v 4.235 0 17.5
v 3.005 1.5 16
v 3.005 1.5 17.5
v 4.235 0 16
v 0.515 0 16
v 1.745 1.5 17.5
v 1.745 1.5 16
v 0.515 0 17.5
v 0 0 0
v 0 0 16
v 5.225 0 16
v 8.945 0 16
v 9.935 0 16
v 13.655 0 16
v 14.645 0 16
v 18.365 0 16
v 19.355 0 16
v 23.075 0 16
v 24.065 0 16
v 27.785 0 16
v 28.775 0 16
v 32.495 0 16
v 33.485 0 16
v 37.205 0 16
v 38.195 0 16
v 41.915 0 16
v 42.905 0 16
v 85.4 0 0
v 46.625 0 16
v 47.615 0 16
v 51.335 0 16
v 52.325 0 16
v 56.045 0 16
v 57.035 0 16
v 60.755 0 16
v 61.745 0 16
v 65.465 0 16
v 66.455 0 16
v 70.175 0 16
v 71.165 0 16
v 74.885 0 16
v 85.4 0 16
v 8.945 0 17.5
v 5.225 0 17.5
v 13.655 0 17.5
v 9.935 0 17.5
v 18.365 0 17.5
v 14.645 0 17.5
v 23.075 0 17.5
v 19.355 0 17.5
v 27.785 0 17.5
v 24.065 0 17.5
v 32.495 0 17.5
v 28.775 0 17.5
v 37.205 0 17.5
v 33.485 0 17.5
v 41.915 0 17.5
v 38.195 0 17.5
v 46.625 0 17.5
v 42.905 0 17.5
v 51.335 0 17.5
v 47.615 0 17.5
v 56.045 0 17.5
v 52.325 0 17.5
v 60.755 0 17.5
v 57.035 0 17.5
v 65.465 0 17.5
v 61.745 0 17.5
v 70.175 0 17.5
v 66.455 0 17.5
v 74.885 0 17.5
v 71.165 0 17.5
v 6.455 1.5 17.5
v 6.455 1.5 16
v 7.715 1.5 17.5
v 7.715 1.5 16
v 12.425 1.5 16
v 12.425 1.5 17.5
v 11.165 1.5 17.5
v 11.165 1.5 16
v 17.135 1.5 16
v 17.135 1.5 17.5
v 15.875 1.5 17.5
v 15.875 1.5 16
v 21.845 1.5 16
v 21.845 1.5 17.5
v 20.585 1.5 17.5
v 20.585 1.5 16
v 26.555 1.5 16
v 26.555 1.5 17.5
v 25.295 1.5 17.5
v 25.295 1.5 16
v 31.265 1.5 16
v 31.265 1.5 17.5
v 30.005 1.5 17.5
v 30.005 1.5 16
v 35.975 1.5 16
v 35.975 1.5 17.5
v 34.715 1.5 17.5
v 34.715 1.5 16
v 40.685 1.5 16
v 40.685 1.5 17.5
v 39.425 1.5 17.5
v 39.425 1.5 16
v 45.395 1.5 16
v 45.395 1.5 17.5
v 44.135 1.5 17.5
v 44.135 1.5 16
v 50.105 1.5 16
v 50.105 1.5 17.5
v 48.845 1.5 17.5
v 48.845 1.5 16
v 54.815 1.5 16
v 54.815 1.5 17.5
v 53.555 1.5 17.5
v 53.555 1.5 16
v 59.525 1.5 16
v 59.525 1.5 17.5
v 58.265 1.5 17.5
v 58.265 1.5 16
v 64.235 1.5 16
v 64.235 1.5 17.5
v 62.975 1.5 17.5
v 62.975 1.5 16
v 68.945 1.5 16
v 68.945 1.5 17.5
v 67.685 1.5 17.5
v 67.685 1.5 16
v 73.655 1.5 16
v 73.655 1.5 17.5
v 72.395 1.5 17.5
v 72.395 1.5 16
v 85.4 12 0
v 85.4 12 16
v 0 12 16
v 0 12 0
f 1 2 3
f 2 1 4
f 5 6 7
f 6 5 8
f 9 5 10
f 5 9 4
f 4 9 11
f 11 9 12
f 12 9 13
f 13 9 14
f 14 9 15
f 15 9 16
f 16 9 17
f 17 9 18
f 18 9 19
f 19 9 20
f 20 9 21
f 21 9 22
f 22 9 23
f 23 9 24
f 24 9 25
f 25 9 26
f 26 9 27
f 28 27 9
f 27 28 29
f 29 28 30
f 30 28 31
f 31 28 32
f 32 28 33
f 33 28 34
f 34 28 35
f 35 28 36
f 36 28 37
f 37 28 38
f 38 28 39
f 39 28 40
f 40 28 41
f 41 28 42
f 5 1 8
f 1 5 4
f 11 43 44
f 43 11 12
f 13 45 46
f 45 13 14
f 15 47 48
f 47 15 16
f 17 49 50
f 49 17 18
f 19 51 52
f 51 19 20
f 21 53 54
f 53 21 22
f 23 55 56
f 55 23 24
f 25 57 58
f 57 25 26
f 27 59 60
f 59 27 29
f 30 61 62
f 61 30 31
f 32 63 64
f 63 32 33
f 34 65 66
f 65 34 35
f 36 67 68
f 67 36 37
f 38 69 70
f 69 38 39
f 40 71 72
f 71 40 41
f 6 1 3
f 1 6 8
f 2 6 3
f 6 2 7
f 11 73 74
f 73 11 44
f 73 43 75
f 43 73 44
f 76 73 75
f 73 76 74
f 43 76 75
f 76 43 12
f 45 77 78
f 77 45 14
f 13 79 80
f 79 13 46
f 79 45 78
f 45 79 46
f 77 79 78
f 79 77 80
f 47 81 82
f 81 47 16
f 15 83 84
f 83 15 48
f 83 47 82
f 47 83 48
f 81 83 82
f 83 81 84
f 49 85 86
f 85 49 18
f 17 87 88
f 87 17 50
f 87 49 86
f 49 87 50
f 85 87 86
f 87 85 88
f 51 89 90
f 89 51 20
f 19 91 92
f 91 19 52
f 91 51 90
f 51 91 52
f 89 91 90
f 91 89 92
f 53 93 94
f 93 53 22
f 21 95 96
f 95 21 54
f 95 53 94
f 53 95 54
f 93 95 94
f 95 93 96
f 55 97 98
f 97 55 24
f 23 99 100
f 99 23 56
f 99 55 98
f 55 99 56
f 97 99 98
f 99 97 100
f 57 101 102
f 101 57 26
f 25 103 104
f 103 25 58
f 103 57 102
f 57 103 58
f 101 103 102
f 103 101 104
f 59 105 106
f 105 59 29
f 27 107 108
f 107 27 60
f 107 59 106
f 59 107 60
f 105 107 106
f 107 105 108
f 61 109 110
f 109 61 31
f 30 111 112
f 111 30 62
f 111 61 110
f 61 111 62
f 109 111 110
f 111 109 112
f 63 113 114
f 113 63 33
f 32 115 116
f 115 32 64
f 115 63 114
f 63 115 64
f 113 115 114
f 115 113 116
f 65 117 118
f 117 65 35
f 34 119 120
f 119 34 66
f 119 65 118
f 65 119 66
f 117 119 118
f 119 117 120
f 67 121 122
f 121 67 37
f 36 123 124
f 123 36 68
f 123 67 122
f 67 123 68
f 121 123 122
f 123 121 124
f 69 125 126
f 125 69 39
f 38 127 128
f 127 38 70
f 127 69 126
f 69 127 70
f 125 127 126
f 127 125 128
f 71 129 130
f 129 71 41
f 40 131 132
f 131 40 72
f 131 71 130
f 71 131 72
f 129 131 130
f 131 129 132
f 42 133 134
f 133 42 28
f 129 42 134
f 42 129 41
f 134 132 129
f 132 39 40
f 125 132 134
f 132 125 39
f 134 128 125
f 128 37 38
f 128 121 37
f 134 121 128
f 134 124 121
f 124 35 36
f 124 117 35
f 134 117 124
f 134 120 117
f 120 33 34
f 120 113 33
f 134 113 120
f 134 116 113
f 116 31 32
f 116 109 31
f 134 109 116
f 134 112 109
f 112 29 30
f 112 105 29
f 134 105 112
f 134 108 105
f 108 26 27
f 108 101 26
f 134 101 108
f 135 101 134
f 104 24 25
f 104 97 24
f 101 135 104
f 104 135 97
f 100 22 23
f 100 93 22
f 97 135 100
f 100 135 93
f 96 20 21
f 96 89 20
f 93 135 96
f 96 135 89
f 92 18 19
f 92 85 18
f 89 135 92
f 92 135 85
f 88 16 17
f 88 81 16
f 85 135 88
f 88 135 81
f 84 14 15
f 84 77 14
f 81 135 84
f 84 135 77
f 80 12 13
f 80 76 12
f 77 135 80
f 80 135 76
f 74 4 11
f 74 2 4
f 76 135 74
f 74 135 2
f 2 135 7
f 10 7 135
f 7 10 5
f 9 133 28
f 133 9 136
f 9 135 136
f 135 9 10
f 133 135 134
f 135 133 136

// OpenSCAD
$fn = 32;

// ----------------------------------------------------------------------
// Gear rack: m=1.5 z=16, 85.4 x 12 x 17.5 mm
// ----------------------------------------------------------------------

// --- parameters (mm) ---
bar_len = 85.4;           // rack length, X
bar_w = 12;               // rack width, Y
bar_h = 17.5;             // overall height, Z
gear_module = 1.5;        // module
base_t = 16;              // tooth root line height
pitch = 4.71;             // circular pitch
tip_w = 1.26;             // tooth thickness at the tip
root_w = 3.72;            // tooth thickness at the root line
sink = 0.6;               // tooth root overlap into the body

tooth_span = 75.4;

module tooth(x0) {
  /* 20 deg flank profile, sunk into the body for a positive overlap */
  translate([x0, 0, base_t - sink])
    linear_extrude(height = bar_h - base_t + sink)
      polygon(points = [[-root_w / 2, 0], [root_w / 2, 0],
                        [tip_w / 2, bar_h - base_t],
                        [-tip_w / 2, bar_h - base_t]]);
}

difference() {
  union() {
    cube([bar_len, bar_w, base_t]);
    for (i = [0 : 16 - 1])
      tooth((i + 0.5) * pitch + (tooth_span - 16 * pitch) / 2);
  }
}
